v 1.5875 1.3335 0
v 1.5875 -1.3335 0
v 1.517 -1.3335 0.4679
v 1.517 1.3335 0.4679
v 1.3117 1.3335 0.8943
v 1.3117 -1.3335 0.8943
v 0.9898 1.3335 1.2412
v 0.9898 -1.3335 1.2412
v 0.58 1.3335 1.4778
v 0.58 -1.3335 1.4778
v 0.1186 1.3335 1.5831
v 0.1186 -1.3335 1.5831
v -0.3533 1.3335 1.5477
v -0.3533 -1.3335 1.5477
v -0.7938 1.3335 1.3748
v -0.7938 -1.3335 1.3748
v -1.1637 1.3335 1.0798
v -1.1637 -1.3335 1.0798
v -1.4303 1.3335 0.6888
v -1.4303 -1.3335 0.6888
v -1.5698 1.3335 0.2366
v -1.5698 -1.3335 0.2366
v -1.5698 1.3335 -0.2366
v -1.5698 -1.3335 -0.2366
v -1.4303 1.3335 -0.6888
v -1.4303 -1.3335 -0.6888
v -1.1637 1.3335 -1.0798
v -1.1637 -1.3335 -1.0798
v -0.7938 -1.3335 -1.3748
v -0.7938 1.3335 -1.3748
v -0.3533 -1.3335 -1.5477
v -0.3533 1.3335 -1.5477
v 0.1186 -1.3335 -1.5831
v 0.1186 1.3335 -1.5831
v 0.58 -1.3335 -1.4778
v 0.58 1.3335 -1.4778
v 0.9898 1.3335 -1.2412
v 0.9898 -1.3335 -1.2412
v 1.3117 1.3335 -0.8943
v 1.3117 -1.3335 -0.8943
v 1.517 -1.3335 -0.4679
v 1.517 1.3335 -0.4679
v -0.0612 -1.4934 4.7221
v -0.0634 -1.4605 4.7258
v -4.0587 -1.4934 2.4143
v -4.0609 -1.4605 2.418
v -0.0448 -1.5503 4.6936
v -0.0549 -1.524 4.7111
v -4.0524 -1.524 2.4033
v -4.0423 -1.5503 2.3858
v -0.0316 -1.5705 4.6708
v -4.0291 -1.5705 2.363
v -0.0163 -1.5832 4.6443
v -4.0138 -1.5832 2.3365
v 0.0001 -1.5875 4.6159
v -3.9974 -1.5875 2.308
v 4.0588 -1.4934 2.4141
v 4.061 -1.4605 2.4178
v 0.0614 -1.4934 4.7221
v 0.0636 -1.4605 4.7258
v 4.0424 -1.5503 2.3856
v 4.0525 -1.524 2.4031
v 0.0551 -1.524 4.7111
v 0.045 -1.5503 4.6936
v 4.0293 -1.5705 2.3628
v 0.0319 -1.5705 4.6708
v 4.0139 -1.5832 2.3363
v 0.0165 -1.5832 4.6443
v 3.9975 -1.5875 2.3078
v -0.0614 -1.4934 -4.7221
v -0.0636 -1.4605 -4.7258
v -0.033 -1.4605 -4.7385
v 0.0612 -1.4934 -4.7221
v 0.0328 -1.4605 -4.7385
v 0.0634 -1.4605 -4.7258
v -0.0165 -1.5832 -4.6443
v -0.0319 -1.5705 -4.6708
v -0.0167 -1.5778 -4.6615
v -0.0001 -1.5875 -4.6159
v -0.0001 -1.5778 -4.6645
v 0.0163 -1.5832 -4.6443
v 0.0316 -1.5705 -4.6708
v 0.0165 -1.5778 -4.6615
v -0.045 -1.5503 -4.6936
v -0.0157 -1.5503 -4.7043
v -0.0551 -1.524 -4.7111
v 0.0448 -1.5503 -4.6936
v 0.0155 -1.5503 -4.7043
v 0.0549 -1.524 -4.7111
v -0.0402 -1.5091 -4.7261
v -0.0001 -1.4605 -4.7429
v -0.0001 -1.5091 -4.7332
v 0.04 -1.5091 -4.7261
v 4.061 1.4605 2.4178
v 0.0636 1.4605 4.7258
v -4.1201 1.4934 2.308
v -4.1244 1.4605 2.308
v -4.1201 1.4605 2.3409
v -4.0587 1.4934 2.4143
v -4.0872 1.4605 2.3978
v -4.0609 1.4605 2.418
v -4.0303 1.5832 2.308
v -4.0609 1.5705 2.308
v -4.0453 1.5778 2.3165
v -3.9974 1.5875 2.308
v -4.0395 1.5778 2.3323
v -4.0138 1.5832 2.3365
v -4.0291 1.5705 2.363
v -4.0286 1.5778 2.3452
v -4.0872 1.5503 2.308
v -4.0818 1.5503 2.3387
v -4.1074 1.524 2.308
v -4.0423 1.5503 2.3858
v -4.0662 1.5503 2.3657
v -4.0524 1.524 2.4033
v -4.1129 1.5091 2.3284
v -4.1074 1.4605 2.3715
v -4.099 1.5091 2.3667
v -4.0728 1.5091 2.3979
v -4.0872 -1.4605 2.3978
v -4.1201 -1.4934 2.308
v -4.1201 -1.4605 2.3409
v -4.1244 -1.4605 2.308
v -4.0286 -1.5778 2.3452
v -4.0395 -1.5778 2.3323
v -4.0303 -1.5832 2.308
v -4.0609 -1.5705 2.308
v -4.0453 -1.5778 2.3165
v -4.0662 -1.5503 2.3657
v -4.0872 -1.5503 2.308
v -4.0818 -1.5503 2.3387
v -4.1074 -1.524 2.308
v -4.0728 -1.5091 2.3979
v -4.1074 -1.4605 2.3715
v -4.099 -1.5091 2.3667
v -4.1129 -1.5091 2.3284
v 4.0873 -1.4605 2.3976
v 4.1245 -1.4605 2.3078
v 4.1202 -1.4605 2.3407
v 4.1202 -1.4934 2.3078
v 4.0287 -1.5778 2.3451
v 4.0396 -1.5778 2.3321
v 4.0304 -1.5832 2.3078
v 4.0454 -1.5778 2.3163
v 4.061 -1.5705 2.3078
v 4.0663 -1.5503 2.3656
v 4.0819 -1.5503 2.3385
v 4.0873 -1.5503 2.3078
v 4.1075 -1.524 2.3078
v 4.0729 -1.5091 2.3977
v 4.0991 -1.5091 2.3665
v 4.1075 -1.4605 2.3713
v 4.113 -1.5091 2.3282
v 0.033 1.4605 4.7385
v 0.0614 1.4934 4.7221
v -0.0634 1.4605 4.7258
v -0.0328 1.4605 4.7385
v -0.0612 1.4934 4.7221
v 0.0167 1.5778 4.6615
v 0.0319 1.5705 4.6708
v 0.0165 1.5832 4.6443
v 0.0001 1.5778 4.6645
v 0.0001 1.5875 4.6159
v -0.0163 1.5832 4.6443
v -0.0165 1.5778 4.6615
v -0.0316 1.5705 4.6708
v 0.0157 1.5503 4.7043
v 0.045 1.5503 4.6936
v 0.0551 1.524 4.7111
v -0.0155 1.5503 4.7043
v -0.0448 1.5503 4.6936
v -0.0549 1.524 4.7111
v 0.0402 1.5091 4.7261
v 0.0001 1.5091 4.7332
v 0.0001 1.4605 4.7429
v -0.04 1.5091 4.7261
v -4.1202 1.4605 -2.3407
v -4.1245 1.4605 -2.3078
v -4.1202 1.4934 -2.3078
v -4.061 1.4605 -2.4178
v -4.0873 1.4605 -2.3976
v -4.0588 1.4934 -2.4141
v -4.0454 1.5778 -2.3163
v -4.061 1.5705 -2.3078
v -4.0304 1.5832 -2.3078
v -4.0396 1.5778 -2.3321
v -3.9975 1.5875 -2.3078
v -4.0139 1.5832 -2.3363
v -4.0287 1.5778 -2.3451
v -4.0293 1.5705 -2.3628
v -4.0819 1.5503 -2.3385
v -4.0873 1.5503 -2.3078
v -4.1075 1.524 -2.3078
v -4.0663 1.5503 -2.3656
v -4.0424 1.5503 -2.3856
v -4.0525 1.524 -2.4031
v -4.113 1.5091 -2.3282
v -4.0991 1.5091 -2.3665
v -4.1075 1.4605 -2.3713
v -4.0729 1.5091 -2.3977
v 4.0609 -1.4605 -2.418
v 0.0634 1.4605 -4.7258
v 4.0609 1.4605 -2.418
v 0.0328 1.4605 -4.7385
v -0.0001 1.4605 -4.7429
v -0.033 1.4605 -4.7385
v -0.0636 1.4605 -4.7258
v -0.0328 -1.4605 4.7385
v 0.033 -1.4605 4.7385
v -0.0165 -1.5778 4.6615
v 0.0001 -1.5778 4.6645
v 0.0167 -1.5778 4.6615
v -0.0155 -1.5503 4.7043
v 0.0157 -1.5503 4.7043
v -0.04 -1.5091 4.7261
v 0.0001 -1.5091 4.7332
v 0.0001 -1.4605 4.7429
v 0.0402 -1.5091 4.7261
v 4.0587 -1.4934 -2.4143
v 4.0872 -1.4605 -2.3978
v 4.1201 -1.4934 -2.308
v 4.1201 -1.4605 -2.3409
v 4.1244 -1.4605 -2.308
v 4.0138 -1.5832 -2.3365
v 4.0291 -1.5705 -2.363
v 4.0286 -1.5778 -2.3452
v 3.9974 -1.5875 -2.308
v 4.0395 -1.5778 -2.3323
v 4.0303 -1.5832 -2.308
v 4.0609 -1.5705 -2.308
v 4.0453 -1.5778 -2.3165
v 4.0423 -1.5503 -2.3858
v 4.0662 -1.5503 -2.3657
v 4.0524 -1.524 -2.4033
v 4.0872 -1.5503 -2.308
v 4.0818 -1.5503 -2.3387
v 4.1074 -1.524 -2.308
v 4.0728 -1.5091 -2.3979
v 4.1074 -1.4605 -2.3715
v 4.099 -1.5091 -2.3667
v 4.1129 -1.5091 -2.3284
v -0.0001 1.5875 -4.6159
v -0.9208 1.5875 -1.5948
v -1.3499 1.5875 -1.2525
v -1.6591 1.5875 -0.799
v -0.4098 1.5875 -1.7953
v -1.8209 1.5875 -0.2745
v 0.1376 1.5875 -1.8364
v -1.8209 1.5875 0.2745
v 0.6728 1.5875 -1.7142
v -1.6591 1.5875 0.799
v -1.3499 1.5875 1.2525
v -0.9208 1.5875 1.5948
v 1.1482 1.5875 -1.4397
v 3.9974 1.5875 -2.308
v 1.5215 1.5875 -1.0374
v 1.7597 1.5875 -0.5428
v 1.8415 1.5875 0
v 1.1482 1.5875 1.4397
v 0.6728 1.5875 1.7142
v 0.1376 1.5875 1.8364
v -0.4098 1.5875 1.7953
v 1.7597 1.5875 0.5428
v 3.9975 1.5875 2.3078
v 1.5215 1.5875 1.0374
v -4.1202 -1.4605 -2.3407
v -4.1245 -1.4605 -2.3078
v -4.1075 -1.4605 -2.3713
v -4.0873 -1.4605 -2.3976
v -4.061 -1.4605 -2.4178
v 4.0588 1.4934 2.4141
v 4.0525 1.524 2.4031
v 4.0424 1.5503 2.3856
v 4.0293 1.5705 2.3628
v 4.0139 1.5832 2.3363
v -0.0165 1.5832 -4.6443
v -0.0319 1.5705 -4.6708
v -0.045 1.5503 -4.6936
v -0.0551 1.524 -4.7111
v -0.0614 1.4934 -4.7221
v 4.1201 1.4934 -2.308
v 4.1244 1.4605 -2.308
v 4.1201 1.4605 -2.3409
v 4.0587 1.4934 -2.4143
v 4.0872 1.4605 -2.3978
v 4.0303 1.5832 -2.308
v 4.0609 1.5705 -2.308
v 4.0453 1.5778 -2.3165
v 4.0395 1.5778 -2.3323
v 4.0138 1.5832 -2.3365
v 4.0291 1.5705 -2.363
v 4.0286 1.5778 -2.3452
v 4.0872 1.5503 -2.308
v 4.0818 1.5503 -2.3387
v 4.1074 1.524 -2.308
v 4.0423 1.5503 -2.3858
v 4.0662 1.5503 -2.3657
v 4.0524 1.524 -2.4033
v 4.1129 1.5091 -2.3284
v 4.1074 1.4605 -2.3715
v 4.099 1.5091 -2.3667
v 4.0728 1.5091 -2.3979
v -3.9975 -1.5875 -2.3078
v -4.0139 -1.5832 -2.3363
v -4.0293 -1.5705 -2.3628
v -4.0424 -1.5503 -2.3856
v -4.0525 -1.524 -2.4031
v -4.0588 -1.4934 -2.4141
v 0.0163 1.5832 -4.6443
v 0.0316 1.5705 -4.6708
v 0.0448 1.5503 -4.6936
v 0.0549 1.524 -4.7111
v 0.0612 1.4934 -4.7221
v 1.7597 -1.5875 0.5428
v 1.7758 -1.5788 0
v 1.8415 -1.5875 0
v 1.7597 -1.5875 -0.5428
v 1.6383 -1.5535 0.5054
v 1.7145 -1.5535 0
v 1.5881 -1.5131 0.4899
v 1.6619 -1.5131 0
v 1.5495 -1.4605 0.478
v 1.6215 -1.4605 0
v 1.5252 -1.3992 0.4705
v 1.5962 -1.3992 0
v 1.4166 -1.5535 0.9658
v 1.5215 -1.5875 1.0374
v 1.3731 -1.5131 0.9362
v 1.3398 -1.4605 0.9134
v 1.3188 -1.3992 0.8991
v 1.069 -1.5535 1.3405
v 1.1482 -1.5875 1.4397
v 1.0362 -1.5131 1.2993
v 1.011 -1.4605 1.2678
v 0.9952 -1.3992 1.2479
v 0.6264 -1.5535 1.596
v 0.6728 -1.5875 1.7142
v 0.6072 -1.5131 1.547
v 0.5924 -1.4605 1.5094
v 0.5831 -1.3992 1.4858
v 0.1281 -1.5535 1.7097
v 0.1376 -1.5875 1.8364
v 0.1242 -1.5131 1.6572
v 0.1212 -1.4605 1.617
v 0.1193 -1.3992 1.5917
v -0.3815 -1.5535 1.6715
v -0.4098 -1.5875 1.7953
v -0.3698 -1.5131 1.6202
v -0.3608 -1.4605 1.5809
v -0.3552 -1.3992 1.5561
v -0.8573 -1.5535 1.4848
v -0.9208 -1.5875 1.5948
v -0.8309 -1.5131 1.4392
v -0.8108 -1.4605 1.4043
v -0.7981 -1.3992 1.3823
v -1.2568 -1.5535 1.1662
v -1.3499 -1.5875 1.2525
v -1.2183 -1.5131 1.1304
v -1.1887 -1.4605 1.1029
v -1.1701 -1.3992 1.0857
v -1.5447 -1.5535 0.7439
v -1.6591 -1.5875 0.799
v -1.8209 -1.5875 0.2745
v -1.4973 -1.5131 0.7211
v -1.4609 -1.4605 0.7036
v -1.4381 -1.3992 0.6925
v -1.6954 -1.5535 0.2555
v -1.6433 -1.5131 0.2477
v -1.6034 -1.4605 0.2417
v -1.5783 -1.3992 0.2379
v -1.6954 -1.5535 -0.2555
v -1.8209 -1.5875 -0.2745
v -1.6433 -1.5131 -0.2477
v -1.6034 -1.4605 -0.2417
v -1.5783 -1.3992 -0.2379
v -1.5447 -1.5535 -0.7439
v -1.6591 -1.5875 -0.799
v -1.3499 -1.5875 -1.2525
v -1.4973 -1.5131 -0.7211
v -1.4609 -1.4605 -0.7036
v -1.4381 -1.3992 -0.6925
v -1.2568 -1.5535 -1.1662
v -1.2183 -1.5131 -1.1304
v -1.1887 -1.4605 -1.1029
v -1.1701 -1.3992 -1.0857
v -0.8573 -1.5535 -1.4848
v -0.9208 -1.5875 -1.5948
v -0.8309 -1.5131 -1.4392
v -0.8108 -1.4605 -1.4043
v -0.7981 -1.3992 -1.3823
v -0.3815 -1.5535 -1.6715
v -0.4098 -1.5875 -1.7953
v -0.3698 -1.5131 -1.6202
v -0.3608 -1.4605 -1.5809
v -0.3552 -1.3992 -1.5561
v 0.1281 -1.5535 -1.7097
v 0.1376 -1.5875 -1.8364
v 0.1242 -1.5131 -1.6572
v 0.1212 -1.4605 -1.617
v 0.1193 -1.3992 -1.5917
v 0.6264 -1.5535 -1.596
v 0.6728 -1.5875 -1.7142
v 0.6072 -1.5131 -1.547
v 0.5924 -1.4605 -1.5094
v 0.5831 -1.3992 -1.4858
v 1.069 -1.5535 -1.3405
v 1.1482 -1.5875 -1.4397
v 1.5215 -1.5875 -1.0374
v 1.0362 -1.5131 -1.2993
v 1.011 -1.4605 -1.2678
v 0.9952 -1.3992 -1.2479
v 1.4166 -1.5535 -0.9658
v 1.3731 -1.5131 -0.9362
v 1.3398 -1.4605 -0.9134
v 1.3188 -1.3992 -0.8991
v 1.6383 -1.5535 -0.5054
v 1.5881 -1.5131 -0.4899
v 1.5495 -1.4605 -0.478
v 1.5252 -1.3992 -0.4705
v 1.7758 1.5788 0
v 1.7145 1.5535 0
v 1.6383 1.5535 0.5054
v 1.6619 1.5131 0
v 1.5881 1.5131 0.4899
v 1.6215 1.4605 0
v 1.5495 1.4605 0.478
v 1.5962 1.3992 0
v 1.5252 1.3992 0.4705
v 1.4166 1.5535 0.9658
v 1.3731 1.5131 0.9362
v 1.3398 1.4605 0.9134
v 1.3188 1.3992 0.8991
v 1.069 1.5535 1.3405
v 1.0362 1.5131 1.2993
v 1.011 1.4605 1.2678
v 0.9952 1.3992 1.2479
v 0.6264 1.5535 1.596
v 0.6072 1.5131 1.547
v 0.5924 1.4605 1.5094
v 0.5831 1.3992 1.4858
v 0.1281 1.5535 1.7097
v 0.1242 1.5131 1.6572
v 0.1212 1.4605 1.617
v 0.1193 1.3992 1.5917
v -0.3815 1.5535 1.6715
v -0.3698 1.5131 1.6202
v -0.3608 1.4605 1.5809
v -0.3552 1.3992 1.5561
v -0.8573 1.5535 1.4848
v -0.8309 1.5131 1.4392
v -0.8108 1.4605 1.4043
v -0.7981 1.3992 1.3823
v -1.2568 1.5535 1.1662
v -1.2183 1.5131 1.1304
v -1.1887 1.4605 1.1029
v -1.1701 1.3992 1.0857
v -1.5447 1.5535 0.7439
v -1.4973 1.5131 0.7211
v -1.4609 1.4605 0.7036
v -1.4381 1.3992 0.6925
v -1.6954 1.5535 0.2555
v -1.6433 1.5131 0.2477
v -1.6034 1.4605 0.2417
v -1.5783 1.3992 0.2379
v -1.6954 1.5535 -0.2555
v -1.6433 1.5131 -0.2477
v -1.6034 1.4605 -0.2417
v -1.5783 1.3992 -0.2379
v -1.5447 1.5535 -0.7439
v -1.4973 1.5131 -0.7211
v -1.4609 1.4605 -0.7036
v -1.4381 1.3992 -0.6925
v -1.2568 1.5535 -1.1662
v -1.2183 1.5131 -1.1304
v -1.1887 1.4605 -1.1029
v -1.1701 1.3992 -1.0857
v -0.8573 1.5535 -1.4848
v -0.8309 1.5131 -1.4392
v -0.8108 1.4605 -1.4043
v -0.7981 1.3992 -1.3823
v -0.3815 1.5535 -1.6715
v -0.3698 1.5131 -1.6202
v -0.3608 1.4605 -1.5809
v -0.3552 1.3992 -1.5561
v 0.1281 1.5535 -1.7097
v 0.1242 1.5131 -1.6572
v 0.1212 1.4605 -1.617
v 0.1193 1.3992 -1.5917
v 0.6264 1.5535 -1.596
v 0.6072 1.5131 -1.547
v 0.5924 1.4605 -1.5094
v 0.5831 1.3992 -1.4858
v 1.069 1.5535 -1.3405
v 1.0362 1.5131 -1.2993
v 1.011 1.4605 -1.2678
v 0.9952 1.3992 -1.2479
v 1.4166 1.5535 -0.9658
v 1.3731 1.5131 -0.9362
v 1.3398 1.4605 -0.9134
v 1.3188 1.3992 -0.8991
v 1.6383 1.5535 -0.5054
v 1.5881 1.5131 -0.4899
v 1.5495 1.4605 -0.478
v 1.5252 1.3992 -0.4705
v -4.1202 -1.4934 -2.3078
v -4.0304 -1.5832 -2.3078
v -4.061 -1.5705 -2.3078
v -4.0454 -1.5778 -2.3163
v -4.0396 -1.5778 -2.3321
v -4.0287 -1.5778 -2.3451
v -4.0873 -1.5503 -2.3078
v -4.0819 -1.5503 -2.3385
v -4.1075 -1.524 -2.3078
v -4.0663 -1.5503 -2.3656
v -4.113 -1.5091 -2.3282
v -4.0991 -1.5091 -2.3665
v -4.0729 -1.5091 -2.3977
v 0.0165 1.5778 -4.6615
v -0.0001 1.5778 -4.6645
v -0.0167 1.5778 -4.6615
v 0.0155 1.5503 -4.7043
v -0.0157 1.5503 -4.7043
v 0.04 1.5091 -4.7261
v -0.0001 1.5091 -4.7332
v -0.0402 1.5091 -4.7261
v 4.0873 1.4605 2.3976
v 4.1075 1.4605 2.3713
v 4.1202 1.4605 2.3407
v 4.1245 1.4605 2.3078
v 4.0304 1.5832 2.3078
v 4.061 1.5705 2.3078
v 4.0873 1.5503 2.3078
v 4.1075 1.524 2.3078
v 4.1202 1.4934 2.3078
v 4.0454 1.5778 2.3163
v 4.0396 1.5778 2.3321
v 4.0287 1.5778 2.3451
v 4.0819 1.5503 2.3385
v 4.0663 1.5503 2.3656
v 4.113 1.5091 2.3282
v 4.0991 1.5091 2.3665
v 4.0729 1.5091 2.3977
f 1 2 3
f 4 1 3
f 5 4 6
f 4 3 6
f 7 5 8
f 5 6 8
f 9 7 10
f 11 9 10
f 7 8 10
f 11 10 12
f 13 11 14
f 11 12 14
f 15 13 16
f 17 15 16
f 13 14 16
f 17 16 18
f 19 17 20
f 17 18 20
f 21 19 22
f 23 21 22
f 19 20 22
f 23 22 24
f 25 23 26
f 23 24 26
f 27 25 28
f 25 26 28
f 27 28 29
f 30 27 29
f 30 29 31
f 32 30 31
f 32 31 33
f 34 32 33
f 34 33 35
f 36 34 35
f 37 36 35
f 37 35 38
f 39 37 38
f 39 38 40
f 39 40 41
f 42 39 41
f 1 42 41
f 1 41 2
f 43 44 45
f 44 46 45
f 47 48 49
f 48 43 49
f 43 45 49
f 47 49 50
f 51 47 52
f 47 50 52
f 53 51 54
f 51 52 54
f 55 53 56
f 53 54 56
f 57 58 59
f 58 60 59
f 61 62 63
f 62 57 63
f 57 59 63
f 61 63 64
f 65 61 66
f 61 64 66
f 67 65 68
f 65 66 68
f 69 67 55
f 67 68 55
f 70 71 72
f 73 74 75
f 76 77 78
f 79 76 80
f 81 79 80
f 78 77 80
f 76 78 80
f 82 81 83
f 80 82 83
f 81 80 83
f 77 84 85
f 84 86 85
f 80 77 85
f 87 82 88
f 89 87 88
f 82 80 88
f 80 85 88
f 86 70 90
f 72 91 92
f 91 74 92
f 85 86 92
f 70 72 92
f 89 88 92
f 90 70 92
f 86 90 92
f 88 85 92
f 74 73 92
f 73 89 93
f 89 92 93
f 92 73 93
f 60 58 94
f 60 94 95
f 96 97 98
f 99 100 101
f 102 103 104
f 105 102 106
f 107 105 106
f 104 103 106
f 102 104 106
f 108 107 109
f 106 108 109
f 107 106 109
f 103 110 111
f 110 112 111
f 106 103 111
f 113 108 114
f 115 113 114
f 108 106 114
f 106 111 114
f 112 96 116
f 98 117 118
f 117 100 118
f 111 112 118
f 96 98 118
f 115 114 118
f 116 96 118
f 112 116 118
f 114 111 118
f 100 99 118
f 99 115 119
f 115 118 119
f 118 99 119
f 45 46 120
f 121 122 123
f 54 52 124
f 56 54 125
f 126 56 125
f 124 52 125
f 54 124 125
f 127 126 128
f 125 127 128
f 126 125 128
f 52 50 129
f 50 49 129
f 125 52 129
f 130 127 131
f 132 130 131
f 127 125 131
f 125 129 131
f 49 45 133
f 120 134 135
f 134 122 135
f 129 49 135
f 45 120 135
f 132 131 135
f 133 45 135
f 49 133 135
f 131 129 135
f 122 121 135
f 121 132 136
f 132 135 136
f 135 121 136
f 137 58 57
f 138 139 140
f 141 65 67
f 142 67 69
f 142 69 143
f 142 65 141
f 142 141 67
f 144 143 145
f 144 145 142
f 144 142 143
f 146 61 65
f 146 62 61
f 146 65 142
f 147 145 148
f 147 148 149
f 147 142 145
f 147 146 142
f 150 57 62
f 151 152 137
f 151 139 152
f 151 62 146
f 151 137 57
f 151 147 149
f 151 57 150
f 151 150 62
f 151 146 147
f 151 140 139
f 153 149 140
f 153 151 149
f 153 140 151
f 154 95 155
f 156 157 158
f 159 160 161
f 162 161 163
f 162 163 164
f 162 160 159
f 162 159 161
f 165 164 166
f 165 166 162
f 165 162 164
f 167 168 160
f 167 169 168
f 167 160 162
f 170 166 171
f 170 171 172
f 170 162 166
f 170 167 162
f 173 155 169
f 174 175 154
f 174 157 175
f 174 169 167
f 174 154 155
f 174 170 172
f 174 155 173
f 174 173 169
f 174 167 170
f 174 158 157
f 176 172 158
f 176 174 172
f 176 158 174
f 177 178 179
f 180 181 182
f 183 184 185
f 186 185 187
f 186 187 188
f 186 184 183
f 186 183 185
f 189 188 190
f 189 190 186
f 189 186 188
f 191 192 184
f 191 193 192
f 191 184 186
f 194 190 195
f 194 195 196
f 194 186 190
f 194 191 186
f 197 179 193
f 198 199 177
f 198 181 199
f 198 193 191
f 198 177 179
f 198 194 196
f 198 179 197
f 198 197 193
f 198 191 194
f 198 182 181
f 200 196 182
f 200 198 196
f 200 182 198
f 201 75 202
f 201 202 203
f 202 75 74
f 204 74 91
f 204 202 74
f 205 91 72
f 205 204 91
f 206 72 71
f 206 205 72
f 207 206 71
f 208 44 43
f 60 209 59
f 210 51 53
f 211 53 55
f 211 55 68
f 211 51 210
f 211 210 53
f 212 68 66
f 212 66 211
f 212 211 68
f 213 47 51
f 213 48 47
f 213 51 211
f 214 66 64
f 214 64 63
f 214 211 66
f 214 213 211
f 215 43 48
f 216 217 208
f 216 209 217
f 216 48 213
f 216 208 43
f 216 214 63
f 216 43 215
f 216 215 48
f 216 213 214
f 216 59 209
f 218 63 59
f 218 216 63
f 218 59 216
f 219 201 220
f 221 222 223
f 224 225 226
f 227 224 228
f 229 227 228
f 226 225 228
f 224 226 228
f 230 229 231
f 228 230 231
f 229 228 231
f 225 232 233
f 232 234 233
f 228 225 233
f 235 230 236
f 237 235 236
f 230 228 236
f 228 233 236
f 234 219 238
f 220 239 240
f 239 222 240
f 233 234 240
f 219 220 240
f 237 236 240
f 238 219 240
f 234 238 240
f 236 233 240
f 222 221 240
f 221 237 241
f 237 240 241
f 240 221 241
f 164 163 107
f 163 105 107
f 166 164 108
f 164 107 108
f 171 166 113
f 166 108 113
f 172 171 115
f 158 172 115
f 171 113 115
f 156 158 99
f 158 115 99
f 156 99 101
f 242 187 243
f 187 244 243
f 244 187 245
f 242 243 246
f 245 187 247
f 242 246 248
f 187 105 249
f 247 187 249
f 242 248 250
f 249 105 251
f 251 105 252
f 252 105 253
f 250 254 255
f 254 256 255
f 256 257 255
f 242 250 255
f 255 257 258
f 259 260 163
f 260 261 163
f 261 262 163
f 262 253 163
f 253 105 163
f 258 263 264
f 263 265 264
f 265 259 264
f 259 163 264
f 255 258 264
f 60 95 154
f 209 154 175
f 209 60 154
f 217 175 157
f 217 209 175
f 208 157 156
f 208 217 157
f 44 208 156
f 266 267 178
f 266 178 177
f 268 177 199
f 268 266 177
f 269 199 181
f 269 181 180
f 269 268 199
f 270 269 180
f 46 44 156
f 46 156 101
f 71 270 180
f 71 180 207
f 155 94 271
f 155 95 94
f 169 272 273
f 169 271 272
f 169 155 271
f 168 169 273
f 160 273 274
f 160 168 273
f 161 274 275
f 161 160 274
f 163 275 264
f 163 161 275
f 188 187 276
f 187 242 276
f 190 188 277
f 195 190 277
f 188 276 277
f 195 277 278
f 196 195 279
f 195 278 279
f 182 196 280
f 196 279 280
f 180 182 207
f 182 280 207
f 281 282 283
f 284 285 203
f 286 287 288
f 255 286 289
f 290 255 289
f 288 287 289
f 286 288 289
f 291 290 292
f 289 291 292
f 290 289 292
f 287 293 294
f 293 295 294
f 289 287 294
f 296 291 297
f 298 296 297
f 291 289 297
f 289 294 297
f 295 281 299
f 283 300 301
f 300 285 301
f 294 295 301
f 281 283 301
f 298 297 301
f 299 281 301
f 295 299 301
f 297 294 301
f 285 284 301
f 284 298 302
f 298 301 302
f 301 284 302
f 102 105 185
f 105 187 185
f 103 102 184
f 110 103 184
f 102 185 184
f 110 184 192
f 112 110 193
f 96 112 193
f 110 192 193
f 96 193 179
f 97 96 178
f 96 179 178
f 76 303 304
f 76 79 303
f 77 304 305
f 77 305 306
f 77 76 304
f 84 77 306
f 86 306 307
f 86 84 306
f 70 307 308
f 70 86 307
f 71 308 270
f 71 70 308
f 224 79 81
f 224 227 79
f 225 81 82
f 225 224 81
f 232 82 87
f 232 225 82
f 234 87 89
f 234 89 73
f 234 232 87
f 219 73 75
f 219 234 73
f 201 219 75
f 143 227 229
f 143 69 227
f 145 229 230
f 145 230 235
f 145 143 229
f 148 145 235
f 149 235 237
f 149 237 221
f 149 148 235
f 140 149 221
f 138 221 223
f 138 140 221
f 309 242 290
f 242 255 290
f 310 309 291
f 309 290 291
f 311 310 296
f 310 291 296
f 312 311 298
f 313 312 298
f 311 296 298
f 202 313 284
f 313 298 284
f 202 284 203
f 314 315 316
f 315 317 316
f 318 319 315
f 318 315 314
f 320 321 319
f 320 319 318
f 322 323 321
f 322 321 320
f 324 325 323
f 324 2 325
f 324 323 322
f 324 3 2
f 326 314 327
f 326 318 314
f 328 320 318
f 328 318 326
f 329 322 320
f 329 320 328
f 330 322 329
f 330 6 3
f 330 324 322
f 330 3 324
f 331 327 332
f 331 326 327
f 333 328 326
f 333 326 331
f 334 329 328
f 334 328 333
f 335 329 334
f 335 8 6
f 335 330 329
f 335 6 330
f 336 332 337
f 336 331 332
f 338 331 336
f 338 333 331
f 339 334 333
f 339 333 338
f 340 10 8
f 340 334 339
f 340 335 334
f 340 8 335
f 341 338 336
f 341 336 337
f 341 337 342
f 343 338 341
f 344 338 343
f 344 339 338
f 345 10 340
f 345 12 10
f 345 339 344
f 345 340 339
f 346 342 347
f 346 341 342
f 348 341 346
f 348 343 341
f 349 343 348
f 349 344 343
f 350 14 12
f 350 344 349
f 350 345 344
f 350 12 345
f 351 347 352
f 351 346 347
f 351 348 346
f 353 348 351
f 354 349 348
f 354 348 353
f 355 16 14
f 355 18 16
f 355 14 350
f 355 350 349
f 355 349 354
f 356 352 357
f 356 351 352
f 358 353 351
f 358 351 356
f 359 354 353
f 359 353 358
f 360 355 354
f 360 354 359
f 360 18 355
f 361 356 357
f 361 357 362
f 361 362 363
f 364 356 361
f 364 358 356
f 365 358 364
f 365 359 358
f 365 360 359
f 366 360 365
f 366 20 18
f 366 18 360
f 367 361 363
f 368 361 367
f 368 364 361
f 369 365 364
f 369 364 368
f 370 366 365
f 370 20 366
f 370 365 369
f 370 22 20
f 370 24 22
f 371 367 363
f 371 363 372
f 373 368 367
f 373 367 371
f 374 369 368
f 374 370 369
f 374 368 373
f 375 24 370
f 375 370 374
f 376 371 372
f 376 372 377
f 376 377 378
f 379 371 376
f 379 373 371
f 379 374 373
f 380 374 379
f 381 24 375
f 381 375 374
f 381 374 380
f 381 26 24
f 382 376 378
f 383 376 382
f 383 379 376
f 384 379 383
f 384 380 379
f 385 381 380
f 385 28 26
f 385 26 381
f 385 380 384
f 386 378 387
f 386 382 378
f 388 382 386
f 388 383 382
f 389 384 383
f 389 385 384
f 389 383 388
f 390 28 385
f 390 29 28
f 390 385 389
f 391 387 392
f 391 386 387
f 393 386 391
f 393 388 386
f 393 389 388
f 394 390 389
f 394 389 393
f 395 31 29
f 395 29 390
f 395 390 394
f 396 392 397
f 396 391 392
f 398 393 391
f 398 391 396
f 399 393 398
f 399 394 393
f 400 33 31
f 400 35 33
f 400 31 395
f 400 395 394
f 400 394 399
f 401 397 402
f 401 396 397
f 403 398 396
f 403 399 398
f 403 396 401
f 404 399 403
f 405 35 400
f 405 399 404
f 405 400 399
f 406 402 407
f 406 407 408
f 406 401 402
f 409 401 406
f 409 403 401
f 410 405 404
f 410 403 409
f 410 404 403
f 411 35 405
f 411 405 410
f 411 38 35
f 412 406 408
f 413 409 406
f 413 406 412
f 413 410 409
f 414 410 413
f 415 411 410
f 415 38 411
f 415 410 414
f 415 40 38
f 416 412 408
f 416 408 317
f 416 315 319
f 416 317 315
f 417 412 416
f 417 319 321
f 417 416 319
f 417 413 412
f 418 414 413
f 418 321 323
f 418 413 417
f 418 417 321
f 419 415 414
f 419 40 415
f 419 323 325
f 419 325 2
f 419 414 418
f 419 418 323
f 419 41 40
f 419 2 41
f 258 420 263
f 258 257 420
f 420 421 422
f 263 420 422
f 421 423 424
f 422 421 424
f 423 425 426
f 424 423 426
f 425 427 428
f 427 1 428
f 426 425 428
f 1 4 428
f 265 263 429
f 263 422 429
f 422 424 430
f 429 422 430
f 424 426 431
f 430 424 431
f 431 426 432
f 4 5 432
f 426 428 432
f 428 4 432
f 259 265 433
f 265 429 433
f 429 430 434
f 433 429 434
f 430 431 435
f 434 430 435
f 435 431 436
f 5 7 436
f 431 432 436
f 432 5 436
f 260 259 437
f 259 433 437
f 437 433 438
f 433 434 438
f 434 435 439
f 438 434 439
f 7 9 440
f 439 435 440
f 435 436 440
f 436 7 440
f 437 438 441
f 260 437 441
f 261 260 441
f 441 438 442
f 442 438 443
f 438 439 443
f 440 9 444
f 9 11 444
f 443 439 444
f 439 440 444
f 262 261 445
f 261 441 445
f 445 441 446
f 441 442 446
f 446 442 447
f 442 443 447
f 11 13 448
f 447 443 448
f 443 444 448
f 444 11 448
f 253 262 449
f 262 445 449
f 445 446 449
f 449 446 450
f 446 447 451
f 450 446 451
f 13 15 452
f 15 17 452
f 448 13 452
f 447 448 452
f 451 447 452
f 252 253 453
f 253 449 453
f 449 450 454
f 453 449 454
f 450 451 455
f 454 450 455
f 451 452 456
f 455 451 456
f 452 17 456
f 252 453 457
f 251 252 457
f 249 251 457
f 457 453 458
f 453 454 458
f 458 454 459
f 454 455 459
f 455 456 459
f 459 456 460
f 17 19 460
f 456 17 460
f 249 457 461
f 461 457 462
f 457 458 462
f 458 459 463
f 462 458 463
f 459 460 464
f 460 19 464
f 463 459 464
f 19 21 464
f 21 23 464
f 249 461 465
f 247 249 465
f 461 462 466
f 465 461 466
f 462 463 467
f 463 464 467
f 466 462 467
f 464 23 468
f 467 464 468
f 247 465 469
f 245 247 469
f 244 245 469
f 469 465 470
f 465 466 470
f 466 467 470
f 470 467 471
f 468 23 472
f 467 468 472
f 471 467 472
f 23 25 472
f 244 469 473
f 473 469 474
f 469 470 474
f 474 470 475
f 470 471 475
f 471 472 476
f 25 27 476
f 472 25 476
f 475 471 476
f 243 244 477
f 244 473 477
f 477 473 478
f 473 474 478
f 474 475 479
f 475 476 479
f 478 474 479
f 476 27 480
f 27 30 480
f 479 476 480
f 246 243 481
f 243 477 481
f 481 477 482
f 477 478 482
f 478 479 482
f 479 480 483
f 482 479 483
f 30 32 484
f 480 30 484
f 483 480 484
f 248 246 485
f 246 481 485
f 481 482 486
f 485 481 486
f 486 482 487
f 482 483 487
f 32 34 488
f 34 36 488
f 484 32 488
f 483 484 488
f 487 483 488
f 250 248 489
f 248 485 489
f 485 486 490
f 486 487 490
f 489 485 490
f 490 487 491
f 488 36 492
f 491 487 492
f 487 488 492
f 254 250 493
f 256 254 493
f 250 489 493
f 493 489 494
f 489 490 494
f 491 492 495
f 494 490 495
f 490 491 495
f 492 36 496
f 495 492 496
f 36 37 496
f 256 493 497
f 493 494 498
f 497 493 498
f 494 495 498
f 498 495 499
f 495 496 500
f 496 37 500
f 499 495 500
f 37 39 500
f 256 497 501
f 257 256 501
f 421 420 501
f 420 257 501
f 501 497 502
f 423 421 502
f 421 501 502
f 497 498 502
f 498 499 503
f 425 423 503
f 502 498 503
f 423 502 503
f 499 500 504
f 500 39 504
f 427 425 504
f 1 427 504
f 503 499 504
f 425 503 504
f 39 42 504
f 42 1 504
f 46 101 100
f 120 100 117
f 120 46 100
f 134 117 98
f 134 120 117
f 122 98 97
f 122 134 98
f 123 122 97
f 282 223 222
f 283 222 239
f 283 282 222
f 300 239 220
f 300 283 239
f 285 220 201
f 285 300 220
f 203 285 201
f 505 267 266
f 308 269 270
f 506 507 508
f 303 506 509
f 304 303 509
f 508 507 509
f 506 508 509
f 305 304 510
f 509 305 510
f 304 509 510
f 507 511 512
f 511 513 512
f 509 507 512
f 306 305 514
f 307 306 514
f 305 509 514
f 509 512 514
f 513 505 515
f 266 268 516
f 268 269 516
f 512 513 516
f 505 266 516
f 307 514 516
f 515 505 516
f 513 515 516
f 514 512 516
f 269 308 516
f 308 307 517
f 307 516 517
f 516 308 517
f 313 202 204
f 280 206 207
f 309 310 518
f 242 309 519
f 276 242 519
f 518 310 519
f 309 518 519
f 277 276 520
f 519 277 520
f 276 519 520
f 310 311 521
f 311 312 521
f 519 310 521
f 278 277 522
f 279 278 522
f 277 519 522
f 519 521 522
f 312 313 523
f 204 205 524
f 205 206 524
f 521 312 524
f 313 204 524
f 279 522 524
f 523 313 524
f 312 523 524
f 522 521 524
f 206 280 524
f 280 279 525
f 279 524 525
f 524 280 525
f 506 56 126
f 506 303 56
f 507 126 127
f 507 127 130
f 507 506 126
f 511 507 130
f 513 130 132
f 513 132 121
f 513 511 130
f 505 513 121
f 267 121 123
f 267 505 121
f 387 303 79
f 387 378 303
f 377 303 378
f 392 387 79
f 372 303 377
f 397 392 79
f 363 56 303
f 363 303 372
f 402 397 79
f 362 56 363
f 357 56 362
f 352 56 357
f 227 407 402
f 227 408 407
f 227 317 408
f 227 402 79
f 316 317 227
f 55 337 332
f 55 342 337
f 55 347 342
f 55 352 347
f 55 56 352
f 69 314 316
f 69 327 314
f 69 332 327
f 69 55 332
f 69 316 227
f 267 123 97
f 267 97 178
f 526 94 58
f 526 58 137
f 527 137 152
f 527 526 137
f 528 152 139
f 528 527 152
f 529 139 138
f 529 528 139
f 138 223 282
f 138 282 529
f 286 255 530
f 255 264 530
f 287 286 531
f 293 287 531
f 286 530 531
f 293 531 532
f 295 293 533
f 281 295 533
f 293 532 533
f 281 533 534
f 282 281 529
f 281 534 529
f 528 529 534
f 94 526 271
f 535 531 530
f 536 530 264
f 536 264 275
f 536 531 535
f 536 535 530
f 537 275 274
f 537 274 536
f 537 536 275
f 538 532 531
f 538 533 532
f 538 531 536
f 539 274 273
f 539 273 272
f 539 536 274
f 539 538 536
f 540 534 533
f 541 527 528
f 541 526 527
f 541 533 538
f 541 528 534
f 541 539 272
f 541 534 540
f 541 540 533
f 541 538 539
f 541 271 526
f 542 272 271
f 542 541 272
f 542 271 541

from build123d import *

# Parameters (mm, degrees)
F1_DEPTH = 1.5875
F2_R     = 1.5875
F3_DEPTH = 3.176
F4_R     = 0.127
F5_R     = 0.254


with BuildPart() as f1:
    # F0 (on Front) → F1 (new body, symmetric)
    with BuildSketch(Plane.XZ):
        Polygon((4.1245009758, 2.3811547516), (0.0001099827, 4.7624999987), (-4.1243909931, 2.3813452472), (-4.1245009758, -2.3811547516), (-0.0001099827, -4.7624999987), (4.1243909931, -2.3813452472), align=None)
    extrude(amount=F1_DEPTH, both=True)

    # F2 (on face) → F3 (cut, through all)
    with BuildSketch(Plane.XZ.offset(1.5875)):
        Circle(F2_R)
    extrude(amount=-F3_DEPTH, mode=Mode.SUBTRACT)

    # F4
    f4_edges = [f1.edges().sort_by_distance(p)[0] for p in [
        (-2.062141, -1.5875, 3.571923),
        (-4.124446, -1.5875, 9.5e-05),
        (2.062305, -1.5875, 3.571827),
        (-2.062305, -1.5875, -3.571827),
        (2.062141, -1.5875, -3.571923),
        (4.124446, -1.5875, -9.5e-05),
        (4.124501, 0, 2.381155),
        (0.00011, 0, 4.7625),
        (4.124446, 1.5875, -9.5e-05),
        (2.062305, 1.5875, 3.571827),
        (-4.124446, 1.5875, 9.5e-05),
        (-2.062141, 1.5875, 3.571923),
        (2.062141, 1.5875, -3.571923),
        (4.124391, 0, -2.381345),
        (-2.062305, 1.5875, -3.571827),
        (-0.00011, 0, -4.7625),
        (-4.124501, 0, -2.381155),
        (-4.124391, 0, 2.381345),
    ]]
    fillet(f4_edges, radius=F4_R)

    # F5
    f5_edges = [f1.edges().sort_by_distance(p)[0] for p in [
        (-1.998643, -1.5875, 3.461936),
        (1.998803, -1.5875, 3.461844),
        (-3.997446, -1.5875, 9.2e-05),
        (3.997446, -1.5875, -9.2e-05),
        (-1.998803, -1.5875, -3.461844),
        (1.998643, -1.5875, -3.461936),
        (-1.5875, -1.5875, 0),
        (1.5875, 0, 0),
        (-1.5875, 1.5875, 0),
    ]]
    fillet(f5_edges, radius=F5_R)


solid = f1.part
